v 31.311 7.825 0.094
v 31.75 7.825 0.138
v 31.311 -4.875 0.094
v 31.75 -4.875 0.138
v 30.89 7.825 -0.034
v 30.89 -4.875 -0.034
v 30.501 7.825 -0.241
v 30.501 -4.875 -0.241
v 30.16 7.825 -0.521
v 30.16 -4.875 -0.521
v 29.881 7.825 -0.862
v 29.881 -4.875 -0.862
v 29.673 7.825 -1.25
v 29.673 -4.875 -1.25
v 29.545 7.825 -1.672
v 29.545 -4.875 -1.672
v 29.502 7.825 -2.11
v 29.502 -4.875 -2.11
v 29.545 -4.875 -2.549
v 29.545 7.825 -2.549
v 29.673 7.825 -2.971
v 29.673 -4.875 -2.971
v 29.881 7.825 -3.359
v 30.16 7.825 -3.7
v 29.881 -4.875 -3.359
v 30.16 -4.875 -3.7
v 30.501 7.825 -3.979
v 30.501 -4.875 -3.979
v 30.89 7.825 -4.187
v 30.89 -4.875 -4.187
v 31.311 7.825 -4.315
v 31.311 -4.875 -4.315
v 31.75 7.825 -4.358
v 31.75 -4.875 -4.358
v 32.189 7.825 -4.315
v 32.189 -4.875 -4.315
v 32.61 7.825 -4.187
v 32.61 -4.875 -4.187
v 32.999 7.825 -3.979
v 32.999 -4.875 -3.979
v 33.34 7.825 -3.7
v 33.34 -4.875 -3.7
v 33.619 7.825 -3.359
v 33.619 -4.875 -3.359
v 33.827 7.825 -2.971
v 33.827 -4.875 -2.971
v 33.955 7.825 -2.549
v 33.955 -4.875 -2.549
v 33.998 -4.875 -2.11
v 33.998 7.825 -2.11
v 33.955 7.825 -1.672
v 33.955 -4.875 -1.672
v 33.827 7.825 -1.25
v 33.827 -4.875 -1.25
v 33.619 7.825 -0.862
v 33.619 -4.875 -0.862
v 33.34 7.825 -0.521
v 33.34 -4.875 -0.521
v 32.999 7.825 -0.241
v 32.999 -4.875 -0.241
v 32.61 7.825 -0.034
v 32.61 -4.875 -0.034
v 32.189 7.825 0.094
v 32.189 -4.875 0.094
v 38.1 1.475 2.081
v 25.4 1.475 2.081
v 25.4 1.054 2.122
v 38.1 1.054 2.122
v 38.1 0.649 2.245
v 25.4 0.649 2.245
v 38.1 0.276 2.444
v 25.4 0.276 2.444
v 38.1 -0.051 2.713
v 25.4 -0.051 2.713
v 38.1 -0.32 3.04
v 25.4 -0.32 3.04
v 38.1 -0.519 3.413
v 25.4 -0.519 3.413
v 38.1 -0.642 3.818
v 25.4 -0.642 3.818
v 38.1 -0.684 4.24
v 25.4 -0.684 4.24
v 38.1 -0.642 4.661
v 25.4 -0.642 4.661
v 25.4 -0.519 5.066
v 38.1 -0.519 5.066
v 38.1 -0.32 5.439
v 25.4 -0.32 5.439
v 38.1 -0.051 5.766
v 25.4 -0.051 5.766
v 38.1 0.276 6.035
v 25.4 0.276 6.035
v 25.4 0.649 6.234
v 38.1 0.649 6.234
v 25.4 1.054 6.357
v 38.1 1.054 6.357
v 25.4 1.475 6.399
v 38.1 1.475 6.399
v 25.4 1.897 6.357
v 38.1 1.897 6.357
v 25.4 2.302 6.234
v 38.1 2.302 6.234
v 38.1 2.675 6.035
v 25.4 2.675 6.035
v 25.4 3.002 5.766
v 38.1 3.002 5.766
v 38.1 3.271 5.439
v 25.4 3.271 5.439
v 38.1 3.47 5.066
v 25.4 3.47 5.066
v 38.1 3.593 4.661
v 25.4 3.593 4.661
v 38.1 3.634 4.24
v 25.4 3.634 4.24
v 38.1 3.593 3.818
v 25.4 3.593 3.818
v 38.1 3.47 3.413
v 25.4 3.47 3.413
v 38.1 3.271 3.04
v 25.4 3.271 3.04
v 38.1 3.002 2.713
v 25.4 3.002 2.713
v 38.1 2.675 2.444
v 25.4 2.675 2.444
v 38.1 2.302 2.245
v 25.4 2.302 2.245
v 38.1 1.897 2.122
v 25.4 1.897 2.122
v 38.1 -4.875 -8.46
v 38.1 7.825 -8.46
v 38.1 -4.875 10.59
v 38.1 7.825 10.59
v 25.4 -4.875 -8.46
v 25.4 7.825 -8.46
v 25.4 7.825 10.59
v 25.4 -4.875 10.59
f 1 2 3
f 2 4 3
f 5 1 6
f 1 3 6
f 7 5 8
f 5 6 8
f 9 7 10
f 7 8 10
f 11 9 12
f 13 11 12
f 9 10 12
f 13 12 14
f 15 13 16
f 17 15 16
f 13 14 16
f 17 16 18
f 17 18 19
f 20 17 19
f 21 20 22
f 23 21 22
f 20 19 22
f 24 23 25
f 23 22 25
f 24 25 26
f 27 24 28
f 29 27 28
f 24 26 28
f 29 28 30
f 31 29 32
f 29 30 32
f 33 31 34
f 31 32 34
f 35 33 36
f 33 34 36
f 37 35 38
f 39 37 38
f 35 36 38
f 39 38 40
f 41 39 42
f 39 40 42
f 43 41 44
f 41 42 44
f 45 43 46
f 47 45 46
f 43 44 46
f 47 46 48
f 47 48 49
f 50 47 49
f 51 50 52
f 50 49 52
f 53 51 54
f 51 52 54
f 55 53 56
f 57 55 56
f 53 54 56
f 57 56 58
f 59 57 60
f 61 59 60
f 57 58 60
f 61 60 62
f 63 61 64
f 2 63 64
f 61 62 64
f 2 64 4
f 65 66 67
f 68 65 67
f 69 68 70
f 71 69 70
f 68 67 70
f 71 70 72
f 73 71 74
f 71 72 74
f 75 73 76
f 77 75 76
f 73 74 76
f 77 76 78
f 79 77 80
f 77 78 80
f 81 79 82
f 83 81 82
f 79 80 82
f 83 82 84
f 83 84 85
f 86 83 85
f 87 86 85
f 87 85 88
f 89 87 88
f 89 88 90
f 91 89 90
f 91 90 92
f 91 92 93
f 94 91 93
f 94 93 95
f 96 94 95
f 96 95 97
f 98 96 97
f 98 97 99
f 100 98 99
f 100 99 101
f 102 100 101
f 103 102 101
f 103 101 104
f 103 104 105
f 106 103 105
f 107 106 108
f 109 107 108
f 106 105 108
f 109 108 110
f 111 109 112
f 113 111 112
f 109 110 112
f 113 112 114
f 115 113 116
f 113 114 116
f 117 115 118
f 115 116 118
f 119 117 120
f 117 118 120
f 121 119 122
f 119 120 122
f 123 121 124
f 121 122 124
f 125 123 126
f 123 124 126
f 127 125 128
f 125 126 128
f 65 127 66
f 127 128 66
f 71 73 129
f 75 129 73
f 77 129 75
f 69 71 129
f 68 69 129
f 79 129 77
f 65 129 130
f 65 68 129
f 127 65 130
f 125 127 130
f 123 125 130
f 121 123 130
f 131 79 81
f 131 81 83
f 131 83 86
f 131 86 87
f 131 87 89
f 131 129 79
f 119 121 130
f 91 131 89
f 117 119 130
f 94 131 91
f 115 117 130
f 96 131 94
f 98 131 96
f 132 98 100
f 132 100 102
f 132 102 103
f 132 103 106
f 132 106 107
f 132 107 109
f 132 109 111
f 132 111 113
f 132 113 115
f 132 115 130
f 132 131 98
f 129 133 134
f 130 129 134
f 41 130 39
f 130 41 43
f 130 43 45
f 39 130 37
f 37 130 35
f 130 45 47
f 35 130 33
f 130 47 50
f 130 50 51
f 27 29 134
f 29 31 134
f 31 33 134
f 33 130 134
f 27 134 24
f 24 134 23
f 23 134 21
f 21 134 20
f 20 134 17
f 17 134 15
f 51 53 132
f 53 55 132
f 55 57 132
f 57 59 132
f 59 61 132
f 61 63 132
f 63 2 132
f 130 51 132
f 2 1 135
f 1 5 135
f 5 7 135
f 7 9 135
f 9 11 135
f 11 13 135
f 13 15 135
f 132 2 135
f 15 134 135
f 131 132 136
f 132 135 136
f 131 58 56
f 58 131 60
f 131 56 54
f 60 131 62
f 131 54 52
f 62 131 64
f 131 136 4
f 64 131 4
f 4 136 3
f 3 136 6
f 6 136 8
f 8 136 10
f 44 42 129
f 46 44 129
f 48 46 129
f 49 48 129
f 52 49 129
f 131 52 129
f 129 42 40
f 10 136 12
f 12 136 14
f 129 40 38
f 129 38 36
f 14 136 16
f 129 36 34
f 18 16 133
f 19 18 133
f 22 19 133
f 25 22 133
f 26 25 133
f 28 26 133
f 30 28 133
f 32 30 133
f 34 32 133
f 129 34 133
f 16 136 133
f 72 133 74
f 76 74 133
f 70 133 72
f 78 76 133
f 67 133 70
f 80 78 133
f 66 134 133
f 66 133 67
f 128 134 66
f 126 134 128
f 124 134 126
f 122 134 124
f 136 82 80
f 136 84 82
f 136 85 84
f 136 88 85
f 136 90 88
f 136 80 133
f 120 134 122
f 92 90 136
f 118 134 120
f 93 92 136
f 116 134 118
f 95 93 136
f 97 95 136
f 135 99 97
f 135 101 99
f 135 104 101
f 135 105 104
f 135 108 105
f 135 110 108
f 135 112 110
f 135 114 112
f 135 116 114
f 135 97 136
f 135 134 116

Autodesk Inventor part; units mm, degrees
ref_plane "YZ Plane" through (0, 0, 0) normal (1, 0, 0) x (0, 1, 0)
ref_plane "XZ Plane" through (0, 0, 0) normal (0, 1, 0) x (-1, 0, 0)
ref_plane "XY Plane" through (0, 0, 0) normal (0, 0, 1) x (1, 0, 0)
sketch "Sketch1" plane through (0, 0, 0) normal (1, 0, 0) x (0, 1, 0)
  line L0 (7.8254, 10.5896) -> (-4.8746, 10.5896)
  line L1 (-4.8746, 10.5896) -> (-4.8746, -8.4604)
  line L2 (-4.8746, -8.4604) -> (7.8254, -8.4604)
  line L3 (7.8254, -8.4604) -> (7.8254, 10.5896)
  point P0 (0, 0)
  dimension "d0" = 19.05
  dimension "d1" = 12.7
extrude "Extrusion1" add sketch "Sketch1" along normal blind 38.1
sketch "Sketch2" plane through (38.1, 0, 0) normal (1, 0, 0) x (0, 0, -1)
  line L0 (-10.5896, 7.8254) -> (-10.5896, -4.8746) projected
  line L1 (8.4604, 7.8254) -> (-10.5896, 7.8254) projected
  point P0 (0, 0)
  point P1 (-4.2396, 1.4754)
  dimension "d4" = 6.35
  dimension "d5" = 6.35
hole "Hole1" at (38.1, 1.4754, 4.2396) direction (-1, 0, 0) diameter 4.318 end through all
sketch "Sketch3" plane through (0, 7.8254, 10.5896) normal (0, 1, 0) x (1, 0, 0)
  line L0 (38.1, 19.05) -> (38.1, 0) projected
  line L1 (0, 19.05) -> (0, 0) projected
  line L2 (0, 19.05) -> (38.1, 19.05) projected
  point P0 (0, 10.5896)
  point P1 (6.35, 12.7)
  point P2 (31.75, 12.7)
  dimension "d13" = 6.35
  dimension "d14" = 6.35
  dimension "d15" = 6.35
  dimension "d16" = 0
hole "Hole2" at (6.35, 7.8254, -2.1104) at (31.75, 7.8254, -2.1104) direction (0, -1, 0) diameter 4.4958 end through all clearance for "Flat Head Machine Screw (82)" size "#8" standard "Ansi Unified Screw Threads"
sketch "Sketch4" plane through (0, 7.8254, 10.5896) normal (0, 1, 0) x (1, 0, 0)
  line L0 (-8.5328, 26.8788) -> (25.4, 26.8788)
  line L1 (25.4, 26.8788) -> (25.4, -5.2507)
  line L2 (25.4, -5.2507) -> (-8.5328, -5.2507)
  line L3 (-8.5328, -5.2507) -> (-8.5328, 26.8788)
  line L4 (0, 19.05) -> (0, 0) projected
  point P0 (0, 10.5896)
  dimension "d24" = 25.4
extrude "Extrusion2" cut sketch "Sketch4" against normal blind 112.7125
properties part number "MotorSpacerBlock3"
